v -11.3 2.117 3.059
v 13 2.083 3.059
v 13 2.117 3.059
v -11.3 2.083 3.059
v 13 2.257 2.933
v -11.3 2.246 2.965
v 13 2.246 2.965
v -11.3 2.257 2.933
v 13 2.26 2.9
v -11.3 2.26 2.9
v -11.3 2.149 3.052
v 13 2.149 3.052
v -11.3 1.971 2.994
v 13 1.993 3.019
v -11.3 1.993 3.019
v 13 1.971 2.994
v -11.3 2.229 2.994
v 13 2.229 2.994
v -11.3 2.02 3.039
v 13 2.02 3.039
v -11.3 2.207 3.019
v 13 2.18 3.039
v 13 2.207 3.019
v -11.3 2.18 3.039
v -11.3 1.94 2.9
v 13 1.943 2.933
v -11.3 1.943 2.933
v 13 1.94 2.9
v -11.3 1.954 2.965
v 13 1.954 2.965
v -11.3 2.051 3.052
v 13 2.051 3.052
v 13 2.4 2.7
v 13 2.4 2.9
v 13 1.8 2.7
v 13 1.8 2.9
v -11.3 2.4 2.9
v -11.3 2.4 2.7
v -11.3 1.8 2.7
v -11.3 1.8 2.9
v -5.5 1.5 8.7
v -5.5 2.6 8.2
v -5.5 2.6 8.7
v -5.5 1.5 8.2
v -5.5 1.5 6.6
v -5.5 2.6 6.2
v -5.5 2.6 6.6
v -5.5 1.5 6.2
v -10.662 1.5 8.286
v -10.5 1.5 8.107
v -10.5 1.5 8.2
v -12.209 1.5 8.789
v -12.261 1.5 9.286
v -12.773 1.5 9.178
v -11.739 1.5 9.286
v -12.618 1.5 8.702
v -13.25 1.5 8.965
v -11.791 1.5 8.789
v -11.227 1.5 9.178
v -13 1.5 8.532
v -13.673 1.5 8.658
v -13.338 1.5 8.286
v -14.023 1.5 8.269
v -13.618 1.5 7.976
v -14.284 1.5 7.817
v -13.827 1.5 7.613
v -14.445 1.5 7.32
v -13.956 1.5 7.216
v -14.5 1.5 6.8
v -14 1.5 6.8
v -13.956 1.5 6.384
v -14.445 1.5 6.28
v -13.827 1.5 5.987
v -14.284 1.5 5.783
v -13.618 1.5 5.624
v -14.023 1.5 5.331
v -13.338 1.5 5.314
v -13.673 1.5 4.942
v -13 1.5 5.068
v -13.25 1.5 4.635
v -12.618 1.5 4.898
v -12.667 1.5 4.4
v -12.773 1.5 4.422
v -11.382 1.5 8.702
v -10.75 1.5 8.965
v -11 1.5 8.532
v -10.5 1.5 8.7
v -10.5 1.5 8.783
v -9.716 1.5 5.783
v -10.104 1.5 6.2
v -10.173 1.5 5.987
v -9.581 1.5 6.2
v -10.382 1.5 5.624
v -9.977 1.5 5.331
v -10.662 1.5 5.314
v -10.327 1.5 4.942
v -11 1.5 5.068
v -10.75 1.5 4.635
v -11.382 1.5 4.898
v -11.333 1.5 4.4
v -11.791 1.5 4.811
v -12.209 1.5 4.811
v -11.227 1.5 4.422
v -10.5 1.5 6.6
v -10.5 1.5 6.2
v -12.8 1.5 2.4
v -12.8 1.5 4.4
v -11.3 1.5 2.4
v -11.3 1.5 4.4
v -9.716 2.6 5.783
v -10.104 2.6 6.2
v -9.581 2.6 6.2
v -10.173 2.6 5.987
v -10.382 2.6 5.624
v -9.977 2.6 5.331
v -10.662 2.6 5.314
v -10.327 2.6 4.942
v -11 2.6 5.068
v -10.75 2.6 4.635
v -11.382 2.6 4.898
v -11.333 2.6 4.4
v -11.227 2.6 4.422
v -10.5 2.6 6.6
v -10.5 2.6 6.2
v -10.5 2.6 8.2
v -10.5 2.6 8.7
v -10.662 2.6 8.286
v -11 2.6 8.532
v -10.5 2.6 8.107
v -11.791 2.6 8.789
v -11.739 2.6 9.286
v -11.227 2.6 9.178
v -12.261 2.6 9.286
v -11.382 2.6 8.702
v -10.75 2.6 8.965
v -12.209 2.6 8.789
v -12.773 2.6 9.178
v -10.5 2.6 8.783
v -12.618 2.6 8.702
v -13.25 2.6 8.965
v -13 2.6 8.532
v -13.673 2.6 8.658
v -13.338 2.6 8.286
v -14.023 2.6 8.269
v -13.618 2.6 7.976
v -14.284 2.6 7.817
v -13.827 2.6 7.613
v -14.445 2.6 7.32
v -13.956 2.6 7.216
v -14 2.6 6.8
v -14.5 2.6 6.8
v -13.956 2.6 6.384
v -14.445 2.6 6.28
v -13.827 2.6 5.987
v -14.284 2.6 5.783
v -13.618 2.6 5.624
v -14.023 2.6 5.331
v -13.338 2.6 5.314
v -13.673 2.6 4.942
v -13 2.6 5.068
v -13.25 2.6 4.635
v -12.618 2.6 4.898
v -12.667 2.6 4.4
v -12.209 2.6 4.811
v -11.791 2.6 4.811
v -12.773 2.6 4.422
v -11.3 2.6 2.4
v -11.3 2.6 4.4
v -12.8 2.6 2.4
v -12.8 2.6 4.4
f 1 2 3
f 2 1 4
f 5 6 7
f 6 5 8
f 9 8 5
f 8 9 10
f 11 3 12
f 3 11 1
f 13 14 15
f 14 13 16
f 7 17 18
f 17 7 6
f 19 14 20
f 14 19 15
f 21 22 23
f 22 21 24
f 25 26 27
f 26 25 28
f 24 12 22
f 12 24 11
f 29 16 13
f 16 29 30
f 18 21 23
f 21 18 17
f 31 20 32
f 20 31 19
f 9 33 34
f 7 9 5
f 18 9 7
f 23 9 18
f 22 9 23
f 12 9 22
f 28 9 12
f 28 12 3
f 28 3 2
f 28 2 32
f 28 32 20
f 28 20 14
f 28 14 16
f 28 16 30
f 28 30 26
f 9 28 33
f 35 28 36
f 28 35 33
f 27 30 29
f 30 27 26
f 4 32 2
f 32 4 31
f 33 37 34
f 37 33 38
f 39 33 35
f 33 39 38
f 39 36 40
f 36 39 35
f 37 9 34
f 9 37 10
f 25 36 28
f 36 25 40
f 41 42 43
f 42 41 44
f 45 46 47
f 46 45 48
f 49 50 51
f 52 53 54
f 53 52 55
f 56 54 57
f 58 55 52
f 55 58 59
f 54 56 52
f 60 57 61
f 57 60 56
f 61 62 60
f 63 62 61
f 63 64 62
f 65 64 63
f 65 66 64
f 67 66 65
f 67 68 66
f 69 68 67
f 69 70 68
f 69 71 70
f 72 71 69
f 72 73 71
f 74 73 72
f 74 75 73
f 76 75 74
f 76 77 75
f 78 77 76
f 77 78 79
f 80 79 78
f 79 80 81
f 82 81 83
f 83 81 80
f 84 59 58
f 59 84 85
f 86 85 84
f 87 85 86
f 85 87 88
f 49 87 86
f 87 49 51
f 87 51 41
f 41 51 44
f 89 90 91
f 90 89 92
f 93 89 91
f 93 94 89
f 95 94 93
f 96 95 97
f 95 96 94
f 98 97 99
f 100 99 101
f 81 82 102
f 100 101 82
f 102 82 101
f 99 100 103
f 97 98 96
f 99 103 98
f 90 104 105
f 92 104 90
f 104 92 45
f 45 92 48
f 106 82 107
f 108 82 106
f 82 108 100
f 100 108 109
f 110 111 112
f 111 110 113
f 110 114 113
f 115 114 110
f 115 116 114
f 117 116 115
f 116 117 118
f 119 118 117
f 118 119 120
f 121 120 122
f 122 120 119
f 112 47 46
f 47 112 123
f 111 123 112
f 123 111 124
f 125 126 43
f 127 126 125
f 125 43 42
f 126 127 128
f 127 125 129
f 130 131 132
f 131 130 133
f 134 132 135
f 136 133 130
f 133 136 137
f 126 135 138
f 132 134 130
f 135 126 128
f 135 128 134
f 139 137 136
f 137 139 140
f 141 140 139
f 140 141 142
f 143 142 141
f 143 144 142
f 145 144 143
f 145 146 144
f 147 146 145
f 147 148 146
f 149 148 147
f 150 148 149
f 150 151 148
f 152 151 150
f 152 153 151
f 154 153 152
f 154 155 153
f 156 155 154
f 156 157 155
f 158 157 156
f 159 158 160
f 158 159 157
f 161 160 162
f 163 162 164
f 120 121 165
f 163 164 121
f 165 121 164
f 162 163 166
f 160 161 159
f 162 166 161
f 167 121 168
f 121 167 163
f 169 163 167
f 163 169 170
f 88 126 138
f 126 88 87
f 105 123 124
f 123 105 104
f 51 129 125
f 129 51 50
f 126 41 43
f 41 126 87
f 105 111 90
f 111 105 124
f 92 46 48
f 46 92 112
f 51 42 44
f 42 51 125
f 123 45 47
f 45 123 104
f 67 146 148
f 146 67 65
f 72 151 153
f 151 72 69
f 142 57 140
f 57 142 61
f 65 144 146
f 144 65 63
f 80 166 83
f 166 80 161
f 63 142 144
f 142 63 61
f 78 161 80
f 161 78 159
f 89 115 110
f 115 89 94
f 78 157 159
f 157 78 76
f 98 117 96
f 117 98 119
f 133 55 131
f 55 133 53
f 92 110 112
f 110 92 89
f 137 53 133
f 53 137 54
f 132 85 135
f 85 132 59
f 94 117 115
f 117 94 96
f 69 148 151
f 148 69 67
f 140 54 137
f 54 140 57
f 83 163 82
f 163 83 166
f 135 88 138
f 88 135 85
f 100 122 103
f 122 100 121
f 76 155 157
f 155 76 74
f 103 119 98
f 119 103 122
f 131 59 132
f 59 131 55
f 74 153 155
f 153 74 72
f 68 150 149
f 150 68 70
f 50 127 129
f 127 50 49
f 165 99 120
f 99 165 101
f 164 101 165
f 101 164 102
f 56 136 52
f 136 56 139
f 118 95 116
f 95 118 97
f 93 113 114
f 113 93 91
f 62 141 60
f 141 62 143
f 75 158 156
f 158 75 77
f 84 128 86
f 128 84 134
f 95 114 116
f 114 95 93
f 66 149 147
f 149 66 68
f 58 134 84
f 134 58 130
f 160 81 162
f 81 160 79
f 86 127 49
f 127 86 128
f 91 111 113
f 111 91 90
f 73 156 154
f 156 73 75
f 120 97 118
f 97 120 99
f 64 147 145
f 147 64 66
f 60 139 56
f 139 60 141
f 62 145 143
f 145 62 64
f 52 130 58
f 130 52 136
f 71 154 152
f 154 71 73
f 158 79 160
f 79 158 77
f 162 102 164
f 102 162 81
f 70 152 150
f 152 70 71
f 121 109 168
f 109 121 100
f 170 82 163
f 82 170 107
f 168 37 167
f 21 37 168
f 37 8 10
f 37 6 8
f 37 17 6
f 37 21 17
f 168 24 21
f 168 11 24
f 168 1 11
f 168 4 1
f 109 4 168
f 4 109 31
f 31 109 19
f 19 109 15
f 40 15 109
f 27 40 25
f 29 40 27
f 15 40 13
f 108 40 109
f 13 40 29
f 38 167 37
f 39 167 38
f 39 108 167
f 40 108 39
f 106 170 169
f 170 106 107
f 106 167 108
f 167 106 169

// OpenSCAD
// bâton avec bec de canard
// Duck bill stick
// Une long prisme rectangulaire avec un long demi cylindre (placer verticalement)
// Long rectangular prisim with half cylinder (vertical)
$fn=30; 
translate([-12,1.30,1.4])	{
rotate(a=120,v=[1,1,1])translate([0.8,1.5,0])cylinder(r=0.16,h=25);	
rotate(a=270,v=[5,0,0])translate([0,-1.5,0.5])cube(size=[25,0.2,0.6]);
								}
union() 					{
// bec du canard 
// Duck bill
translate([0,0.1,1.8])rotate(a=90,v=[1,0,0])	{
difference()		{	
translate([-10.5,4.4,-2.5])cube(size=[5,2.5,1.1]);
translate([-10.5,4.8,-2.5])cube(size=[5,1.6,1.5]);
						}
// tête du canard connecter au bec
//Duck head connected to bill			
difference()		{
translate([-12,5,-2.5])cylinder(r=2.5,h=1.1);
translate([-12,5,-2.5])cylinder(r=2,h=1.1);
translate([-10.5,4.8,-2.6])cube(size=[3,10,1.5]);
						}
//cou du canard
//Duck neck
translate ([-10,11,-4])rotate(a=120,v=[1,1,1])
translate([-10.4,1.5,-2.8])cube(size=[2,1.1,1.5]);
															}
			}	
